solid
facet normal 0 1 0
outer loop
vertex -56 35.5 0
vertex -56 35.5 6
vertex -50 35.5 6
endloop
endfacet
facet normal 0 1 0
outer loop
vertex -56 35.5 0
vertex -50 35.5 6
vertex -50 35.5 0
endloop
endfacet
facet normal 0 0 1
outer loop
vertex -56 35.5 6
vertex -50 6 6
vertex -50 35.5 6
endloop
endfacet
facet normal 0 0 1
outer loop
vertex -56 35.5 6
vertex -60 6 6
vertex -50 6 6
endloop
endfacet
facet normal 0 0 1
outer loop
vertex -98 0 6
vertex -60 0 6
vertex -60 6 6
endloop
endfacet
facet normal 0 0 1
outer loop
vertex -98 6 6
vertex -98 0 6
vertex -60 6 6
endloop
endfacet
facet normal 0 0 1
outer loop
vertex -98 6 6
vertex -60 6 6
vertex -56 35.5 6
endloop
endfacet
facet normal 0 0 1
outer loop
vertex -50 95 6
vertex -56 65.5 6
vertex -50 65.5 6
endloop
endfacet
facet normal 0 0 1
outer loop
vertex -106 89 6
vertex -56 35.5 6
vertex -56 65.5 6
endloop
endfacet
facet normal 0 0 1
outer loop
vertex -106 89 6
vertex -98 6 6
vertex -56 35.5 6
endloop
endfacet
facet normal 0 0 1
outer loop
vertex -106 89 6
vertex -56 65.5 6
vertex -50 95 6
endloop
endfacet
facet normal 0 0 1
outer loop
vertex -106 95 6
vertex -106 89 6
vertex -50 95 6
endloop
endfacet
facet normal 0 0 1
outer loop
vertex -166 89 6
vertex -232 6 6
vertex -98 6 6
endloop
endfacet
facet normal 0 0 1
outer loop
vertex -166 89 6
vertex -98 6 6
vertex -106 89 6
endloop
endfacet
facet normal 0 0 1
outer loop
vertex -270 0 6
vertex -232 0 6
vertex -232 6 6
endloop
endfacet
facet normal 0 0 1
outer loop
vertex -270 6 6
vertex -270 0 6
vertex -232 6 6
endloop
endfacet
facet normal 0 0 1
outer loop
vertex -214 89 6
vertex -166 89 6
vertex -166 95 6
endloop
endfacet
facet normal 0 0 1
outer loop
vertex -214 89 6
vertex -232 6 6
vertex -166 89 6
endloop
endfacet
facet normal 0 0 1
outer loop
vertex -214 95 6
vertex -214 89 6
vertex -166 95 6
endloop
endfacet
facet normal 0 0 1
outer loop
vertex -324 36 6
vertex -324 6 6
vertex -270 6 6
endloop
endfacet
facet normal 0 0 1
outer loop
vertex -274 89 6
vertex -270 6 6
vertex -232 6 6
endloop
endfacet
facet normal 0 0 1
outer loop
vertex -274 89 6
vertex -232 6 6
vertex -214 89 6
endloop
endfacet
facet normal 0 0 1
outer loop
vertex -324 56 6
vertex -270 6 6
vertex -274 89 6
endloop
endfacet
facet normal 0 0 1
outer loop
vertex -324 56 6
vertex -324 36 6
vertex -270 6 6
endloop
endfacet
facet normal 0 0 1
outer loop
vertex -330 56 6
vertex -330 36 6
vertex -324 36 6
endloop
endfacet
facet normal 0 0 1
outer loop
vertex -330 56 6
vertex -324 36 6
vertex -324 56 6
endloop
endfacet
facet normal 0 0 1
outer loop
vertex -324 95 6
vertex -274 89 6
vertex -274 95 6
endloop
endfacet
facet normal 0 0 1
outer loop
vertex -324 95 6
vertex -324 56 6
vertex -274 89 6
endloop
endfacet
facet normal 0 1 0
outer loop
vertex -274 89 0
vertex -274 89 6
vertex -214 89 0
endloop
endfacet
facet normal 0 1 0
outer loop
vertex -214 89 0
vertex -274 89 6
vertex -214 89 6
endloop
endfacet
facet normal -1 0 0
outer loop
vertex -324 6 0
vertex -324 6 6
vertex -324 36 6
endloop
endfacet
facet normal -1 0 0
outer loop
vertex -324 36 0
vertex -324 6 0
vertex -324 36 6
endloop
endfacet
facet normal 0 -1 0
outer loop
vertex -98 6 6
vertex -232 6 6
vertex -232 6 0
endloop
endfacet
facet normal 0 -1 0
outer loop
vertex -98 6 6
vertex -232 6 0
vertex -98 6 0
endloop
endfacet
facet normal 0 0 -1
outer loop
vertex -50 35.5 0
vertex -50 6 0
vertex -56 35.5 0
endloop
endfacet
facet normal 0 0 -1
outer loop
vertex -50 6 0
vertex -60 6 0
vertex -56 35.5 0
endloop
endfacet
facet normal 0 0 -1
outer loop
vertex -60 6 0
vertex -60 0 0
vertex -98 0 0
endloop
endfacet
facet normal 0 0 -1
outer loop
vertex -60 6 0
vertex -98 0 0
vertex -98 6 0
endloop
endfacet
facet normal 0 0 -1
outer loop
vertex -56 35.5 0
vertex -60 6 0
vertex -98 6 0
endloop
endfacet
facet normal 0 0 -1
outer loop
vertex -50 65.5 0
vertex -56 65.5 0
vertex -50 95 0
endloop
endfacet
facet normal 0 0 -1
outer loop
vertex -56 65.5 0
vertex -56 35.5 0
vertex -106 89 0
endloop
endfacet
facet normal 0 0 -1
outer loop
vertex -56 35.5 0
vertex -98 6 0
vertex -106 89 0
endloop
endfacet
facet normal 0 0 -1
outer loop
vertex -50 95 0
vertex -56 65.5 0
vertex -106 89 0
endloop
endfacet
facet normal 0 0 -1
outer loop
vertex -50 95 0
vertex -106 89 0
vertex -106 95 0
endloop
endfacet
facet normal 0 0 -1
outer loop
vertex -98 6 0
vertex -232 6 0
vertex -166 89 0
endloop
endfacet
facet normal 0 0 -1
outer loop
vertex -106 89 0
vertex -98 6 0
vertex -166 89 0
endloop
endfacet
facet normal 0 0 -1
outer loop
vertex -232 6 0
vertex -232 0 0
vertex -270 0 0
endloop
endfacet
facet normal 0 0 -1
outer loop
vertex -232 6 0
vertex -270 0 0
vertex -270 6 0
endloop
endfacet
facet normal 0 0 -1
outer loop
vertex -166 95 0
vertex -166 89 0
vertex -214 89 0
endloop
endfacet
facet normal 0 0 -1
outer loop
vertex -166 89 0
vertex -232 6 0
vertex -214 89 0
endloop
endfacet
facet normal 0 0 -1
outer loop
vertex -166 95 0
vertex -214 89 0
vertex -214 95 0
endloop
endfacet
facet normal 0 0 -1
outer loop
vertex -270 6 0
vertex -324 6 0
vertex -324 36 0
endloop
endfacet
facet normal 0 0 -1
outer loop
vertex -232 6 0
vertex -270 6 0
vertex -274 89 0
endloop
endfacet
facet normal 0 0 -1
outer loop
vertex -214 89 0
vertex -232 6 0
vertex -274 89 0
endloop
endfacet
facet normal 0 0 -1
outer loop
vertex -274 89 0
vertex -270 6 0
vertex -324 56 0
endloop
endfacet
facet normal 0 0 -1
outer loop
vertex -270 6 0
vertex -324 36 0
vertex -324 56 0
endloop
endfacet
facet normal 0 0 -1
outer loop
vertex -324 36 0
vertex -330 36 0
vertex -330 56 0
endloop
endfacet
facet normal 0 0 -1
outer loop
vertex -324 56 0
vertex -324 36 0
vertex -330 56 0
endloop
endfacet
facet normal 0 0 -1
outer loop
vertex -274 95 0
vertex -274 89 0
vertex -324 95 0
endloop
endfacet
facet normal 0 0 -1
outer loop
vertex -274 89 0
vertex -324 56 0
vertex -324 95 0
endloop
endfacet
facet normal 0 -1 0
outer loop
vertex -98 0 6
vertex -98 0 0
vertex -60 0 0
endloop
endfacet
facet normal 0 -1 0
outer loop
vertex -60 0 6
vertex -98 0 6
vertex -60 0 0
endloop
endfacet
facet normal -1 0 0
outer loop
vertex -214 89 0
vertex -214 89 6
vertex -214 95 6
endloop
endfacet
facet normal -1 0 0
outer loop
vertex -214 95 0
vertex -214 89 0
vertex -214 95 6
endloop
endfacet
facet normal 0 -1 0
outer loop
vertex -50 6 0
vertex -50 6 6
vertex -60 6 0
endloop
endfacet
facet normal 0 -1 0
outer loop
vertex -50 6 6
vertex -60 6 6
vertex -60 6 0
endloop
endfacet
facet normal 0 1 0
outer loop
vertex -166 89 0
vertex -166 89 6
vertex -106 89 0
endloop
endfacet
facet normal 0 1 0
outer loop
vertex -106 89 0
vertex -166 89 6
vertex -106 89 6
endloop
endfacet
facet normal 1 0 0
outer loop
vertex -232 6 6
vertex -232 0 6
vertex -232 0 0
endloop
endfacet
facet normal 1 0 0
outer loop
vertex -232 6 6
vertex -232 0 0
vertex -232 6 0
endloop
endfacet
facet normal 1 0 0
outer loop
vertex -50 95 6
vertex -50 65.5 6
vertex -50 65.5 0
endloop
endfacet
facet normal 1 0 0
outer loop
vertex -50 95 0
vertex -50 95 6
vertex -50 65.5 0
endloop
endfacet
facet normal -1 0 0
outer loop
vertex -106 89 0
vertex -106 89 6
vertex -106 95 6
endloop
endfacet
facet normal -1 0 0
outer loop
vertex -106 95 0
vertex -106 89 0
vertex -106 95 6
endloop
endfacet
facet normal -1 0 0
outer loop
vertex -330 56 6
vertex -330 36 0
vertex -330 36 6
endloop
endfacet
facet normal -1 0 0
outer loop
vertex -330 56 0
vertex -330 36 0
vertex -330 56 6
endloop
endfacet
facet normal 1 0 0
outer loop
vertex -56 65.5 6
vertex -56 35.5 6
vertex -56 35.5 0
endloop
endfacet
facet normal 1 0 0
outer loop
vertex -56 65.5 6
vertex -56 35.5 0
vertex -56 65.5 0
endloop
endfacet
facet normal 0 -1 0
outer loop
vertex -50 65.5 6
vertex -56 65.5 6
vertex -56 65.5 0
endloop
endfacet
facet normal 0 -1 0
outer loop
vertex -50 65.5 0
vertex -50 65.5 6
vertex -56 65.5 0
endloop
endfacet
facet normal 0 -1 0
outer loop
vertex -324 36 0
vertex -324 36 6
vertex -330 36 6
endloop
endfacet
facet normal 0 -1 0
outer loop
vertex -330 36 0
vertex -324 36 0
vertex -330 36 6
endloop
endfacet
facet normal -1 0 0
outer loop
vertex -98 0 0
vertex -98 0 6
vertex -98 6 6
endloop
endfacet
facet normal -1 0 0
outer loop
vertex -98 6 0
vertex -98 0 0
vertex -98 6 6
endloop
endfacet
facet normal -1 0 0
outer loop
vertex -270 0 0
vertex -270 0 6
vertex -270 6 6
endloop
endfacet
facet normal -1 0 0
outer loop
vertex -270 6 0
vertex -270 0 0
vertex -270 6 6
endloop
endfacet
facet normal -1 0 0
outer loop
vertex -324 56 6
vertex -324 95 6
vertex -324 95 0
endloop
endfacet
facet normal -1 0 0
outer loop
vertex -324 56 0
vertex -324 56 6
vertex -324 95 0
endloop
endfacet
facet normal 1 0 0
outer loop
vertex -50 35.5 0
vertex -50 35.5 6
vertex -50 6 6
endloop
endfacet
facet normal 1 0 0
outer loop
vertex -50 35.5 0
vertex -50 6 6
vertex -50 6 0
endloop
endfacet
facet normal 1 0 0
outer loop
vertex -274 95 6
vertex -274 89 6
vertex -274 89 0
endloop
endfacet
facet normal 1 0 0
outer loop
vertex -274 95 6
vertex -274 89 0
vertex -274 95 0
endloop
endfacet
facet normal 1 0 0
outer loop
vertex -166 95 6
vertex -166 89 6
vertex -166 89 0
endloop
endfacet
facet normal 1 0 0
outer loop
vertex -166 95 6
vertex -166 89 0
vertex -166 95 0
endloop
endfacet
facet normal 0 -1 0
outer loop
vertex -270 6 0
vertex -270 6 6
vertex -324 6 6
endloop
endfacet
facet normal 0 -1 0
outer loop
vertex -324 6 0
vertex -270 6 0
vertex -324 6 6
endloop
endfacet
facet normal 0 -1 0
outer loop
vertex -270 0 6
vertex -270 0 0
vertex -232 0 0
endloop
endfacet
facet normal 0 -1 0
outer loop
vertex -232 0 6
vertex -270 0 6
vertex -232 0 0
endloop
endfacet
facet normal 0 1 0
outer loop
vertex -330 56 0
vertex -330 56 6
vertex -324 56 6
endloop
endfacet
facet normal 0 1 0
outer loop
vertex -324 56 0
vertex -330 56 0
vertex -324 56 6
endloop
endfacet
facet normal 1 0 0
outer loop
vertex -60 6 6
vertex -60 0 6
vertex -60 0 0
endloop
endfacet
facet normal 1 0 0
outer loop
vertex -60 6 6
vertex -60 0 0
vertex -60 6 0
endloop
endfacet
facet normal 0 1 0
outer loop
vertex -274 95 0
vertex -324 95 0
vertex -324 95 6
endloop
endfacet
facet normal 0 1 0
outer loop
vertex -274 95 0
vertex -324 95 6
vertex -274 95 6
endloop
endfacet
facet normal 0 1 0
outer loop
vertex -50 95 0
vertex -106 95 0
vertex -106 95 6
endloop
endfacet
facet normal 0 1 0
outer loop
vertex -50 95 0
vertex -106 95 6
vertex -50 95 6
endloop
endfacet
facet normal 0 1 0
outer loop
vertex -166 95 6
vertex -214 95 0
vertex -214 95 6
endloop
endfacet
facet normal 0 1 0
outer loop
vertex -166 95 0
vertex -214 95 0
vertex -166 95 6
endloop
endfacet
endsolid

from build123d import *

# Parameters (mm, degrees)
ESQUISSE1_W             = 330
ESQUISSE1_H             = 75
BOSS_EXTRU_1_DEPTH      = 6
ESQUISSE2_W             = 134
ESQUISSE2_H             = 6
ESQUISSE2_W_2           = 6
ESQUISSE2_H_2           = 19
ESQUISSE2_H_3           = 29
ENL_V_MAT_EXTRU_1_DEPTH = 6
ESQUISSE3_W             = 50
ESQUISSE3_H             = 6
BOSS_EXTRU_2_DEPTH      = 70
ESQUISSE5_W             = 6
ESQUISSE5_H             = 40
BOSS_EXTRU_3_DEPTH      = 6
ESQUISSE6_W             = 268
ESQUISSE6_H             = 6
BOSS_EXTRU_4_DEPTH      = 20
ESQUISSE7_W             = 58.270575025
ESQUISSE7_H             = 148.089415769
ESQUISSE7_W_2           = 60
ESQUISSE7_H_2           = 6
ENL_V_MAT_EXTRU_3_DEPTH = 361.50104022
ESQUISSE8_W             = 6
ESQUISSE8_H             = 29.5
BOSS_EXTRU_5_DEPTH      = 6


with BuildPart() as part:
    # Esquisse1 → Boss.-Extru.1 (new body)
    with BuildSketch(Plane.XY):
        with Locations((-165, 37.5)):
            Rectangle(ESQUISSE1_W, ESQUISSE1_H)
    extrude(amount=BOSS_EXTRU_1_DEPTH)

    # Esquisse2 → Enlèv. mat.-Extru.1 (cut)
    with BuildSketch(Plane.XY.offset(6)):
        Polygon((-330, 0), (-270, 0), (-270, 6), (-324, 6), (-324, 36), (-330, 36), align=None)
        Polygon((0, 0), (-60, 0), (-60, 6), (-6, 6), (-6, 26), (0, 26), align=None)
        with Locations((-165, 3)):
            Rectangle(ESQUISSE2_W, ESQUISSE2_H)
        with Locations((-327, 65.5)):
            Rectangle(ESQUISSE2_W_2, ESQUISSE2_H_2)
        with Locations((-3, 60.5)):
            Rectangle(ESQUISSE2_W_2, ESQUISSE2_H_3)
    extrude(amount=-ENL_V_MAT_EXTRU_1_DEPTH, mode=Mode.SUBTRACT)

    # Esquisse3 → Boss.-Extru.2 (add)
    with BuildSketch(Plane(origin=(0, 75, 0), x_dir=(1, 0, 0), z_dir=(0, 1, 0))):
        with Locations((-31, -3)):
            Rectangle(ESQUISSE3_W, ESQUISSE3_H)
    extrude(amount=BOSS_EXTRU_2_DEPTH)

    # Esquisse5 → Boss.-Extru.3 (add)
    with BuildSketch(Plane(origin=(-6, 0, 0), x_dir=(0, 0, -1), z_dir=(1, 0, 0))):
        with Locations((-3, 105)):
            Rectangle(ESQUISSE5_W, ESQUISSE5_H)
    extrude(amount=BOSS_EXTRU_3_DEPTH)

    # Esquisse6 → Boss.-Extru.4 (add)
    with BuildSketch(Plane(origin=(0, 75, 0), x_dir=(1, 0, 0), z_dir=(0, 1, 0))):
        with Locations((-190, -3)):
            Rectangle(ESQUISSE6_W, ESQUISSE6_H)
    extrude(amount=BOSS_EXTRU_4_DEPTH)

    # Esquisse7 → Enlèv. mat.-Extru.3 (cut, through all)
    with BuildSketch(Plane.XY.offset(6)):
        with Locations((-26.864712488, 70.955292116)):
            Rectangle(ESQUISSE7_W, ESQUISSE7_H)
        with Locations((-136, 92)):
            Rectangle(ESQUISSE7_W_2, ESQUISSE7_H_2)
        with Locations((-244, 92)):
            Rectangle(ESQUISSE7_W_2, ESQUISSE7_H_2)
    extrude(amount=-ENL_V_MAT_EXTRU_3_DEPTH, mode=Mode.SUBTRACT)

    # Esquisse8 → Boss.-Extru.5 (add)
    with BuildSketch(Plane(origin=(-56, 0, 0), x_dir=(0, 0, -1), z_dir=(1, 0, 0))):
        with Locations((-3, 20.75)):
            Rectangle(ESQUISSE8_W, ESQUISSE8_H)
        with Locations((-3, 80.25)):
            Rectangle(ESQUISSE8_W, ESQUISSE8_H)
    extrude(amount=BOSS_EXTRU_5_DEPTH)


solid = part.part
